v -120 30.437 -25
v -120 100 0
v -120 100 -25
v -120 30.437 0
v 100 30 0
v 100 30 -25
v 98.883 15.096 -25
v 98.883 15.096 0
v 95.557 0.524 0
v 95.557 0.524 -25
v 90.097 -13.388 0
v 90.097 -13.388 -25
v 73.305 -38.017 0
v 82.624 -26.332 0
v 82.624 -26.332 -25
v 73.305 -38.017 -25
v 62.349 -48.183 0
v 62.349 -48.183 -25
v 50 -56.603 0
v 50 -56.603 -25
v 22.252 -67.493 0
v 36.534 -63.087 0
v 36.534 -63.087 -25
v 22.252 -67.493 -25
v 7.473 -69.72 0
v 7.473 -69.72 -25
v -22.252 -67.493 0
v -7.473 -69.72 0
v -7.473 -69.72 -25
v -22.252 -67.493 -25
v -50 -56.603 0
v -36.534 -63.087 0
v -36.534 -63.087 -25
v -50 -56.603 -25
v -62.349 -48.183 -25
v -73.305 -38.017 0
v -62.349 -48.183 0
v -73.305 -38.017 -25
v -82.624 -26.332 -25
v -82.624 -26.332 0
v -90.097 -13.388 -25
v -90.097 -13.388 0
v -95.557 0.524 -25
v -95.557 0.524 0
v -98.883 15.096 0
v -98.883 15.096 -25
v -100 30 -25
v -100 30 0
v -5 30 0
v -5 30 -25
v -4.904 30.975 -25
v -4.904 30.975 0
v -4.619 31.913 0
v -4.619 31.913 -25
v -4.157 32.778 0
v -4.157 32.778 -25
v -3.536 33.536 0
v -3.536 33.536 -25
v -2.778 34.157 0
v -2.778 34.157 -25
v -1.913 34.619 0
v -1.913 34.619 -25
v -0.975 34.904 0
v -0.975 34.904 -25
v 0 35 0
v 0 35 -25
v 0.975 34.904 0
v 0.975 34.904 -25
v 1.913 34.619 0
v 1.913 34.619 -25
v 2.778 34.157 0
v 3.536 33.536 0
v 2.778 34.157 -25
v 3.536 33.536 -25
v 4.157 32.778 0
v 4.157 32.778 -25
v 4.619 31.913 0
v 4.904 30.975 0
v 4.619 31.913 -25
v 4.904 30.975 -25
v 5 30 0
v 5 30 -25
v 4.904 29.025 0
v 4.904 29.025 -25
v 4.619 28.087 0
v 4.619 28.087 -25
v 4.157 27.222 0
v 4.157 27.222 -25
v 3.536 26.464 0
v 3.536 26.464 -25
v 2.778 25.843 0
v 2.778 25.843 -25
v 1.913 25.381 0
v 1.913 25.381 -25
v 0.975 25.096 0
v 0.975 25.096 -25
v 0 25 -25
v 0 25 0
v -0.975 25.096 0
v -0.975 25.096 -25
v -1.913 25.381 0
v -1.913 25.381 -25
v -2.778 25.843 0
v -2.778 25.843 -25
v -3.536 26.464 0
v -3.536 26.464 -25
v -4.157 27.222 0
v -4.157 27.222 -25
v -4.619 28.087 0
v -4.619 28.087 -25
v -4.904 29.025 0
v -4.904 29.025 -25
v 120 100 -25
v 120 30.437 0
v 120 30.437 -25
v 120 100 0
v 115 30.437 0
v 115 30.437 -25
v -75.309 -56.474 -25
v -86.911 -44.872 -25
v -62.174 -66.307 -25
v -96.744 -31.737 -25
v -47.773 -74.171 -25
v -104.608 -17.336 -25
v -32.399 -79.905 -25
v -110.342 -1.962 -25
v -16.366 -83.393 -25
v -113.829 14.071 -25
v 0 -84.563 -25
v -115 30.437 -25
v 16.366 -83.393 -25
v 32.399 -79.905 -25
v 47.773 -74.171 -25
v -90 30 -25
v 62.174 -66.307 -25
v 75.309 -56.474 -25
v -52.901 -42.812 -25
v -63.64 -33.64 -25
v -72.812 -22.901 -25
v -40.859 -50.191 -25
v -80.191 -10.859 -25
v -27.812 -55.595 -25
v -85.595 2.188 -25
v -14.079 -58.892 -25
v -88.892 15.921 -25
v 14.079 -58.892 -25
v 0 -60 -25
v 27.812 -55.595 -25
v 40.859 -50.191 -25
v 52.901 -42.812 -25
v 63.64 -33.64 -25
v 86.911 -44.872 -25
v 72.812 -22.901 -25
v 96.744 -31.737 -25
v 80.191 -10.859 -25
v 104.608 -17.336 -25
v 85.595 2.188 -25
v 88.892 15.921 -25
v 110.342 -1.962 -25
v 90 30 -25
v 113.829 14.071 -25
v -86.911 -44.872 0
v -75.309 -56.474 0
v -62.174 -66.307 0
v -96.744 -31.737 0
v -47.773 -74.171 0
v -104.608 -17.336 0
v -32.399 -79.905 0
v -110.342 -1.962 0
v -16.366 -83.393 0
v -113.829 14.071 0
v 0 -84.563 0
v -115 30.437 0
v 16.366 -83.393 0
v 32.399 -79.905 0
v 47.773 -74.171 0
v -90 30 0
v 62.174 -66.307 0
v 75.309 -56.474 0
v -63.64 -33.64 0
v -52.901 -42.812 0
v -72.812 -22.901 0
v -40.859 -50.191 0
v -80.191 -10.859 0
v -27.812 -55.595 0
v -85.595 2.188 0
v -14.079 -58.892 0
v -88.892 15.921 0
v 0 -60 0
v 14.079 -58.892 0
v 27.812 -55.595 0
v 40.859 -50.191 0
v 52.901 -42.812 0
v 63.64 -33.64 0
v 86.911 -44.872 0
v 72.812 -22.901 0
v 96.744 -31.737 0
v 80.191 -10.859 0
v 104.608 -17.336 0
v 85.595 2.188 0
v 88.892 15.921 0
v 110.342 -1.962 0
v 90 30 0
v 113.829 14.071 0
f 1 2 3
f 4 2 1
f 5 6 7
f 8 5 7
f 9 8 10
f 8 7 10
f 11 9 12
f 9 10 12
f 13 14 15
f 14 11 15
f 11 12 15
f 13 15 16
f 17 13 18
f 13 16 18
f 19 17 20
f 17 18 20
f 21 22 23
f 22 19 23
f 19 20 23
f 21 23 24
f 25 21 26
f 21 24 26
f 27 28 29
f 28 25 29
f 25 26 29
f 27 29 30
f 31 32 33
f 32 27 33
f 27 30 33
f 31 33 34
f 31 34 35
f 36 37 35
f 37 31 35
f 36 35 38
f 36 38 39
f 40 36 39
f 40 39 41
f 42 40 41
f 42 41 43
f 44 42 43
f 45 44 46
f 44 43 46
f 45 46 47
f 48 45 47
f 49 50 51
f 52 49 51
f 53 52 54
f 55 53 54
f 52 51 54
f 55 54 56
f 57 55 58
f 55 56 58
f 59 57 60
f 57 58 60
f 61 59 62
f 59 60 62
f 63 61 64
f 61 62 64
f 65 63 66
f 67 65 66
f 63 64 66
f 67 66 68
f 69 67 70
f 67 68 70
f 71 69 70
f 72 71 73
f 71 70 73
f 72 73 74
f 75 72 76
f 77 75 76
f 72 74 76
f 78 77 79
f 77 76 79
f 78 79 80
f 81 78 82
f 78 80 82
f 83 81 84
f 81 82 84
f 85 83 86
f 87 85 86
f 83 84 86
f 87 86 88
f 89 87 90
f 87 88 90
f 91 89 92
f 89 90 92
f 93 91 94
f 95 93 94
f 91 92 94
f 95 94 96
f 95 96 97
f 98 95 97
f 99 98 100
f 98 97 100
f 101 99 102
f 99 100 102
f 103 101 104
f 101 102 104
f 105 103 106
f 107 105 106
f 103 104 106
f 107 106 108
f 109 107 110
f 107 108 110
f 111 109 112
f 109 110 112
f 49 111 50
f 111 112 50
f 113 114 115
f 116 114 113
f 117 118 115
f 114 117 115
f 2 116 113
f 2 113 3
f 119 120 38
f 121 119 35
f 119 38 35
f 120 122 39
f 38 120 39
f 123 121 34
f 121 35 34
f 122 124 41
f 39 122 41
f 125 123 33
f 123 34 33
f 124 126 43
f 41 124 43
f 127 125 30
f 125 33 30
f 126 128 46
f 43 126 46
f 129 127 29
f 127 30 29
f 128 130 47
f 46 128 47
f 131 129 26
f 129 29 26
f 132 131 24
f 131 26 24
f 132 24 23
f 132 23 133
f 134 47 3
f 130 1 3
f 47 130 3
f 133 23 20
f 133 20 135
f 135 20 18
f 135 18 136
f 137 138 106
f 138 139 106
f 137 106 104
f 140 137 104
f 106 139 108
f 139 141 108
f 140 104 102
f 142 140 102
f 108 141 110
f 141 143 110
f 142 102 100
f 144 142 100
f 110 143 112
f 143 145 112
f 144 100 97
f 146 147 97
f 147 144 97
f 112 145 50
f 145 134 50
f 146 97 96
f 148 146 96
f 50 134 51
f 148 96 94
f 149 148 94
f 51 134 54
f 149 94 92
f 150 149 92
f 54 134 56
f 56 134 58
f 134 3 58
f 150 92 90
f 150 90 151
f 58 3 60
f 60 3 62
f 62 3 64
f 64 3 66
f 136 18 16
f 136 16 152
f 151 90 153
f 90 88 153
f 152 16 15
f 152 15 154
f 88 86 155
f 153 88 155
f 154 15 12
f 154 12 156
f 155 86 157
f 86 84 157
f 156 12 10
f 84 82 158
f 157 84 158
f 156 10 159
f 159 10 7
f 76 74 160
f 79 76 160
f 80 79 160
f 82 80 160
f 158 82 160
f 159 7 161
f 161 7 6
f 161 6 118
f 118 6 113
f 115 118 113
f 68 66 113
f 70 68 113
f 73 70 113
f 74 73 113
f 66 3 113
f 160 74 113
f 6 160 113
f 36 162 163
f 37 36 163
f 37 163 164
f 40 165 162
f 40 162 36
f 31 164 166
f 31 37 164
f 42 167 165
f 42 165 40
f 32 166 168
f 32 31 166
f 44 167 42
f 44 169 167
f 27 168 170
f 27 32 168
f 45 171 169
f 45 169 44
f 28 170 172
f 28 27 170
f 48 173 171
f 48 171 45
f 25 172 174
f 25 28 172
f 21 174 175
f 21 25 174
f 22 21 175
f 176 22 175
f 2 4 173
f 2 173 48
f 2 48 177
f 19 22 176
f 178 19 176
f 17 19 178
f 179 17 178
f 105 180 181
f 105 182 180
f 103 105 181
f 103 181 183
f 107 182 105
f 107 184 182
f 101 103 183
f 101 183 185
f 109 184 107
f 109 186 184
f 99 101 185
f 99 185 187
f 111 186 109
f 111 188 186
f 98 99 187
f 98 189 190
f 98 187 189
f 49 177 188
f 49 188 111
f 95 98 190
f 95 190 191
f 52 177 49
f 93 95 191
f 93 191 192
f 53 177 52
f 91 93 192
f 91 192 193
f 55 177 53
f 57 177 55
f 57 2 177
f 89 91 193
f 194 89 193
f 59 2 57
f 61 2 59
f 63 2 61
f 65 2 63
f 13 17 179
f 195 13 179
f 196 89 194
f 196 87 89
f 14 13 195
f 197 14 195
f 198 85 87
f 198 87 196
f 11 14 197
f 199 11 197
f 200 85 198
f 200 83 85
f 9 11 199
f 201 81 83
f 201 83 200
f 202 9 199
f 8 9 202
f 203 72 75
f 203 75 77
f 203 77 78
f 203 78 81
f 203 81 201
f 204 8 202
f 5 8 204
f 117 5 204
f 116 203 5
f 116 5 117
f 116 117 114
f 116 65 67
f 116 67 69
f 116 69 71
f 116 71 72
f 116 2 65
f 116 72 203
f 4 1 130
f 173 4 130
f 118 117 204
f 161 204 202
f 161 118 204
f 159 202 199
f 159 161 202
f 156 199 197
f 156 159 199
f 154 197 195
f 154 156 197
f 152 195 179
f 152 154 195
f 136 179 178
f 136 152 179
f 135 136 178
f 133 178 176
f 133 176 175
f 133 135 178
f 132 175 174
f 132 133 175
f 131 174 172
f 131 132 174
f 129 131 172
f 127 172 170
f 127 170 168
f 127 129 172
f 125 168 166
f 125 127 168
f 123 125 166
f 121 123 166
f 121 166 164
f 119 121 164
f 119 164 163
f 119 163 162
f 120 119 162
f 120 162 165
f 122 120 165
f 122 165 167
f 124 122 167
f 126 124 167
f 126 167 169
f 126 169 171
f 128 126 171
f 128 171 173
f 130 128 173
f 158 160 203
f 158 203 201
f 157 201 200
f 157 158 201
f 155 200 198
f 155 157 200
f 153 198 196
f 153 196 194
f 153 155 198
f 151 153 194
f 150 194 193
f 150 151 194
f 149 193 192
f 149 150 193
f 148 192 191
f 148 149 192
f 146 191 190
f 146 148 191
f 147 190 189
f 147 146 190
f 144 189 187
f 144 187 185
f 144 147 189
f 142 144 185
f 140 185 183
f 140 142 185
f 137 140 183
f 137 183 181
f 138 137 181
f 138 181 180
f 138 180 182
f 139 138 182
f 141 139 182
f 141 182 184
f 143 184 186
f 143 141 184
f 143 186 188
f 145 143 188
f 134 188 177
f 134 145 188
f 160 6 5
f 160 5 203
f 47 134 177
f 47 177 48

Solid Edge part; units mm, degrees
sketch "Sketch1" plane through (0, 0, 0) normal (0, 0, 1) x (1, 0, 0)
  line L0 (-120, -100) -> (120, -100)
  line L1 (120, -100) -> (120, 100)
  line L2 (120, 100) -> (-120, 100)
  line L3 (-120, 100) -> (-120, -100)
extrude "Protrusion1" add sketch "Sketch1" against normal blind 25
sketch "Sketch2" plane through (0, 0, -25) normal (0, 0, -1) x (-1, 0, 0)
  circle A0 centre (0, 30) radius 5
  line L0 (-100, 30) -> (-90, 30)
  arc A1 (-90, 30) -> (90, 30) centre (0, 30) ccw
  line L1 (90, 30) -> (100, 30)
  arc A2 (100, 30) -> (-100, 30) centre (0, 30) cw
extrude "ExtrudedCutout_2" cut sketch "Sketch2" against normal blind 25
sketch "Sketch3" plane through (0, 0, -25) normal (0, 0, -1) x (-1, 0, 0)
  line L0 (-115, 30.4369) -> (-120, 30.4369)
  line L1 (-120, 30.4369) -> (-120, -100)
  line L2 (-120, -100) -> (120, -100)
  line L3 (120, -100) -> (120, 30.4369)
  line L4 (120, 30.4369) -> (115, 30.4369)
  arc A0 (115, 30.4369) -> (-115, 30.4369) centre (0, 30.4369) cw
extrude "ExtrudedCutout_3" cut sketch "Sketch3" against normal blind 30
